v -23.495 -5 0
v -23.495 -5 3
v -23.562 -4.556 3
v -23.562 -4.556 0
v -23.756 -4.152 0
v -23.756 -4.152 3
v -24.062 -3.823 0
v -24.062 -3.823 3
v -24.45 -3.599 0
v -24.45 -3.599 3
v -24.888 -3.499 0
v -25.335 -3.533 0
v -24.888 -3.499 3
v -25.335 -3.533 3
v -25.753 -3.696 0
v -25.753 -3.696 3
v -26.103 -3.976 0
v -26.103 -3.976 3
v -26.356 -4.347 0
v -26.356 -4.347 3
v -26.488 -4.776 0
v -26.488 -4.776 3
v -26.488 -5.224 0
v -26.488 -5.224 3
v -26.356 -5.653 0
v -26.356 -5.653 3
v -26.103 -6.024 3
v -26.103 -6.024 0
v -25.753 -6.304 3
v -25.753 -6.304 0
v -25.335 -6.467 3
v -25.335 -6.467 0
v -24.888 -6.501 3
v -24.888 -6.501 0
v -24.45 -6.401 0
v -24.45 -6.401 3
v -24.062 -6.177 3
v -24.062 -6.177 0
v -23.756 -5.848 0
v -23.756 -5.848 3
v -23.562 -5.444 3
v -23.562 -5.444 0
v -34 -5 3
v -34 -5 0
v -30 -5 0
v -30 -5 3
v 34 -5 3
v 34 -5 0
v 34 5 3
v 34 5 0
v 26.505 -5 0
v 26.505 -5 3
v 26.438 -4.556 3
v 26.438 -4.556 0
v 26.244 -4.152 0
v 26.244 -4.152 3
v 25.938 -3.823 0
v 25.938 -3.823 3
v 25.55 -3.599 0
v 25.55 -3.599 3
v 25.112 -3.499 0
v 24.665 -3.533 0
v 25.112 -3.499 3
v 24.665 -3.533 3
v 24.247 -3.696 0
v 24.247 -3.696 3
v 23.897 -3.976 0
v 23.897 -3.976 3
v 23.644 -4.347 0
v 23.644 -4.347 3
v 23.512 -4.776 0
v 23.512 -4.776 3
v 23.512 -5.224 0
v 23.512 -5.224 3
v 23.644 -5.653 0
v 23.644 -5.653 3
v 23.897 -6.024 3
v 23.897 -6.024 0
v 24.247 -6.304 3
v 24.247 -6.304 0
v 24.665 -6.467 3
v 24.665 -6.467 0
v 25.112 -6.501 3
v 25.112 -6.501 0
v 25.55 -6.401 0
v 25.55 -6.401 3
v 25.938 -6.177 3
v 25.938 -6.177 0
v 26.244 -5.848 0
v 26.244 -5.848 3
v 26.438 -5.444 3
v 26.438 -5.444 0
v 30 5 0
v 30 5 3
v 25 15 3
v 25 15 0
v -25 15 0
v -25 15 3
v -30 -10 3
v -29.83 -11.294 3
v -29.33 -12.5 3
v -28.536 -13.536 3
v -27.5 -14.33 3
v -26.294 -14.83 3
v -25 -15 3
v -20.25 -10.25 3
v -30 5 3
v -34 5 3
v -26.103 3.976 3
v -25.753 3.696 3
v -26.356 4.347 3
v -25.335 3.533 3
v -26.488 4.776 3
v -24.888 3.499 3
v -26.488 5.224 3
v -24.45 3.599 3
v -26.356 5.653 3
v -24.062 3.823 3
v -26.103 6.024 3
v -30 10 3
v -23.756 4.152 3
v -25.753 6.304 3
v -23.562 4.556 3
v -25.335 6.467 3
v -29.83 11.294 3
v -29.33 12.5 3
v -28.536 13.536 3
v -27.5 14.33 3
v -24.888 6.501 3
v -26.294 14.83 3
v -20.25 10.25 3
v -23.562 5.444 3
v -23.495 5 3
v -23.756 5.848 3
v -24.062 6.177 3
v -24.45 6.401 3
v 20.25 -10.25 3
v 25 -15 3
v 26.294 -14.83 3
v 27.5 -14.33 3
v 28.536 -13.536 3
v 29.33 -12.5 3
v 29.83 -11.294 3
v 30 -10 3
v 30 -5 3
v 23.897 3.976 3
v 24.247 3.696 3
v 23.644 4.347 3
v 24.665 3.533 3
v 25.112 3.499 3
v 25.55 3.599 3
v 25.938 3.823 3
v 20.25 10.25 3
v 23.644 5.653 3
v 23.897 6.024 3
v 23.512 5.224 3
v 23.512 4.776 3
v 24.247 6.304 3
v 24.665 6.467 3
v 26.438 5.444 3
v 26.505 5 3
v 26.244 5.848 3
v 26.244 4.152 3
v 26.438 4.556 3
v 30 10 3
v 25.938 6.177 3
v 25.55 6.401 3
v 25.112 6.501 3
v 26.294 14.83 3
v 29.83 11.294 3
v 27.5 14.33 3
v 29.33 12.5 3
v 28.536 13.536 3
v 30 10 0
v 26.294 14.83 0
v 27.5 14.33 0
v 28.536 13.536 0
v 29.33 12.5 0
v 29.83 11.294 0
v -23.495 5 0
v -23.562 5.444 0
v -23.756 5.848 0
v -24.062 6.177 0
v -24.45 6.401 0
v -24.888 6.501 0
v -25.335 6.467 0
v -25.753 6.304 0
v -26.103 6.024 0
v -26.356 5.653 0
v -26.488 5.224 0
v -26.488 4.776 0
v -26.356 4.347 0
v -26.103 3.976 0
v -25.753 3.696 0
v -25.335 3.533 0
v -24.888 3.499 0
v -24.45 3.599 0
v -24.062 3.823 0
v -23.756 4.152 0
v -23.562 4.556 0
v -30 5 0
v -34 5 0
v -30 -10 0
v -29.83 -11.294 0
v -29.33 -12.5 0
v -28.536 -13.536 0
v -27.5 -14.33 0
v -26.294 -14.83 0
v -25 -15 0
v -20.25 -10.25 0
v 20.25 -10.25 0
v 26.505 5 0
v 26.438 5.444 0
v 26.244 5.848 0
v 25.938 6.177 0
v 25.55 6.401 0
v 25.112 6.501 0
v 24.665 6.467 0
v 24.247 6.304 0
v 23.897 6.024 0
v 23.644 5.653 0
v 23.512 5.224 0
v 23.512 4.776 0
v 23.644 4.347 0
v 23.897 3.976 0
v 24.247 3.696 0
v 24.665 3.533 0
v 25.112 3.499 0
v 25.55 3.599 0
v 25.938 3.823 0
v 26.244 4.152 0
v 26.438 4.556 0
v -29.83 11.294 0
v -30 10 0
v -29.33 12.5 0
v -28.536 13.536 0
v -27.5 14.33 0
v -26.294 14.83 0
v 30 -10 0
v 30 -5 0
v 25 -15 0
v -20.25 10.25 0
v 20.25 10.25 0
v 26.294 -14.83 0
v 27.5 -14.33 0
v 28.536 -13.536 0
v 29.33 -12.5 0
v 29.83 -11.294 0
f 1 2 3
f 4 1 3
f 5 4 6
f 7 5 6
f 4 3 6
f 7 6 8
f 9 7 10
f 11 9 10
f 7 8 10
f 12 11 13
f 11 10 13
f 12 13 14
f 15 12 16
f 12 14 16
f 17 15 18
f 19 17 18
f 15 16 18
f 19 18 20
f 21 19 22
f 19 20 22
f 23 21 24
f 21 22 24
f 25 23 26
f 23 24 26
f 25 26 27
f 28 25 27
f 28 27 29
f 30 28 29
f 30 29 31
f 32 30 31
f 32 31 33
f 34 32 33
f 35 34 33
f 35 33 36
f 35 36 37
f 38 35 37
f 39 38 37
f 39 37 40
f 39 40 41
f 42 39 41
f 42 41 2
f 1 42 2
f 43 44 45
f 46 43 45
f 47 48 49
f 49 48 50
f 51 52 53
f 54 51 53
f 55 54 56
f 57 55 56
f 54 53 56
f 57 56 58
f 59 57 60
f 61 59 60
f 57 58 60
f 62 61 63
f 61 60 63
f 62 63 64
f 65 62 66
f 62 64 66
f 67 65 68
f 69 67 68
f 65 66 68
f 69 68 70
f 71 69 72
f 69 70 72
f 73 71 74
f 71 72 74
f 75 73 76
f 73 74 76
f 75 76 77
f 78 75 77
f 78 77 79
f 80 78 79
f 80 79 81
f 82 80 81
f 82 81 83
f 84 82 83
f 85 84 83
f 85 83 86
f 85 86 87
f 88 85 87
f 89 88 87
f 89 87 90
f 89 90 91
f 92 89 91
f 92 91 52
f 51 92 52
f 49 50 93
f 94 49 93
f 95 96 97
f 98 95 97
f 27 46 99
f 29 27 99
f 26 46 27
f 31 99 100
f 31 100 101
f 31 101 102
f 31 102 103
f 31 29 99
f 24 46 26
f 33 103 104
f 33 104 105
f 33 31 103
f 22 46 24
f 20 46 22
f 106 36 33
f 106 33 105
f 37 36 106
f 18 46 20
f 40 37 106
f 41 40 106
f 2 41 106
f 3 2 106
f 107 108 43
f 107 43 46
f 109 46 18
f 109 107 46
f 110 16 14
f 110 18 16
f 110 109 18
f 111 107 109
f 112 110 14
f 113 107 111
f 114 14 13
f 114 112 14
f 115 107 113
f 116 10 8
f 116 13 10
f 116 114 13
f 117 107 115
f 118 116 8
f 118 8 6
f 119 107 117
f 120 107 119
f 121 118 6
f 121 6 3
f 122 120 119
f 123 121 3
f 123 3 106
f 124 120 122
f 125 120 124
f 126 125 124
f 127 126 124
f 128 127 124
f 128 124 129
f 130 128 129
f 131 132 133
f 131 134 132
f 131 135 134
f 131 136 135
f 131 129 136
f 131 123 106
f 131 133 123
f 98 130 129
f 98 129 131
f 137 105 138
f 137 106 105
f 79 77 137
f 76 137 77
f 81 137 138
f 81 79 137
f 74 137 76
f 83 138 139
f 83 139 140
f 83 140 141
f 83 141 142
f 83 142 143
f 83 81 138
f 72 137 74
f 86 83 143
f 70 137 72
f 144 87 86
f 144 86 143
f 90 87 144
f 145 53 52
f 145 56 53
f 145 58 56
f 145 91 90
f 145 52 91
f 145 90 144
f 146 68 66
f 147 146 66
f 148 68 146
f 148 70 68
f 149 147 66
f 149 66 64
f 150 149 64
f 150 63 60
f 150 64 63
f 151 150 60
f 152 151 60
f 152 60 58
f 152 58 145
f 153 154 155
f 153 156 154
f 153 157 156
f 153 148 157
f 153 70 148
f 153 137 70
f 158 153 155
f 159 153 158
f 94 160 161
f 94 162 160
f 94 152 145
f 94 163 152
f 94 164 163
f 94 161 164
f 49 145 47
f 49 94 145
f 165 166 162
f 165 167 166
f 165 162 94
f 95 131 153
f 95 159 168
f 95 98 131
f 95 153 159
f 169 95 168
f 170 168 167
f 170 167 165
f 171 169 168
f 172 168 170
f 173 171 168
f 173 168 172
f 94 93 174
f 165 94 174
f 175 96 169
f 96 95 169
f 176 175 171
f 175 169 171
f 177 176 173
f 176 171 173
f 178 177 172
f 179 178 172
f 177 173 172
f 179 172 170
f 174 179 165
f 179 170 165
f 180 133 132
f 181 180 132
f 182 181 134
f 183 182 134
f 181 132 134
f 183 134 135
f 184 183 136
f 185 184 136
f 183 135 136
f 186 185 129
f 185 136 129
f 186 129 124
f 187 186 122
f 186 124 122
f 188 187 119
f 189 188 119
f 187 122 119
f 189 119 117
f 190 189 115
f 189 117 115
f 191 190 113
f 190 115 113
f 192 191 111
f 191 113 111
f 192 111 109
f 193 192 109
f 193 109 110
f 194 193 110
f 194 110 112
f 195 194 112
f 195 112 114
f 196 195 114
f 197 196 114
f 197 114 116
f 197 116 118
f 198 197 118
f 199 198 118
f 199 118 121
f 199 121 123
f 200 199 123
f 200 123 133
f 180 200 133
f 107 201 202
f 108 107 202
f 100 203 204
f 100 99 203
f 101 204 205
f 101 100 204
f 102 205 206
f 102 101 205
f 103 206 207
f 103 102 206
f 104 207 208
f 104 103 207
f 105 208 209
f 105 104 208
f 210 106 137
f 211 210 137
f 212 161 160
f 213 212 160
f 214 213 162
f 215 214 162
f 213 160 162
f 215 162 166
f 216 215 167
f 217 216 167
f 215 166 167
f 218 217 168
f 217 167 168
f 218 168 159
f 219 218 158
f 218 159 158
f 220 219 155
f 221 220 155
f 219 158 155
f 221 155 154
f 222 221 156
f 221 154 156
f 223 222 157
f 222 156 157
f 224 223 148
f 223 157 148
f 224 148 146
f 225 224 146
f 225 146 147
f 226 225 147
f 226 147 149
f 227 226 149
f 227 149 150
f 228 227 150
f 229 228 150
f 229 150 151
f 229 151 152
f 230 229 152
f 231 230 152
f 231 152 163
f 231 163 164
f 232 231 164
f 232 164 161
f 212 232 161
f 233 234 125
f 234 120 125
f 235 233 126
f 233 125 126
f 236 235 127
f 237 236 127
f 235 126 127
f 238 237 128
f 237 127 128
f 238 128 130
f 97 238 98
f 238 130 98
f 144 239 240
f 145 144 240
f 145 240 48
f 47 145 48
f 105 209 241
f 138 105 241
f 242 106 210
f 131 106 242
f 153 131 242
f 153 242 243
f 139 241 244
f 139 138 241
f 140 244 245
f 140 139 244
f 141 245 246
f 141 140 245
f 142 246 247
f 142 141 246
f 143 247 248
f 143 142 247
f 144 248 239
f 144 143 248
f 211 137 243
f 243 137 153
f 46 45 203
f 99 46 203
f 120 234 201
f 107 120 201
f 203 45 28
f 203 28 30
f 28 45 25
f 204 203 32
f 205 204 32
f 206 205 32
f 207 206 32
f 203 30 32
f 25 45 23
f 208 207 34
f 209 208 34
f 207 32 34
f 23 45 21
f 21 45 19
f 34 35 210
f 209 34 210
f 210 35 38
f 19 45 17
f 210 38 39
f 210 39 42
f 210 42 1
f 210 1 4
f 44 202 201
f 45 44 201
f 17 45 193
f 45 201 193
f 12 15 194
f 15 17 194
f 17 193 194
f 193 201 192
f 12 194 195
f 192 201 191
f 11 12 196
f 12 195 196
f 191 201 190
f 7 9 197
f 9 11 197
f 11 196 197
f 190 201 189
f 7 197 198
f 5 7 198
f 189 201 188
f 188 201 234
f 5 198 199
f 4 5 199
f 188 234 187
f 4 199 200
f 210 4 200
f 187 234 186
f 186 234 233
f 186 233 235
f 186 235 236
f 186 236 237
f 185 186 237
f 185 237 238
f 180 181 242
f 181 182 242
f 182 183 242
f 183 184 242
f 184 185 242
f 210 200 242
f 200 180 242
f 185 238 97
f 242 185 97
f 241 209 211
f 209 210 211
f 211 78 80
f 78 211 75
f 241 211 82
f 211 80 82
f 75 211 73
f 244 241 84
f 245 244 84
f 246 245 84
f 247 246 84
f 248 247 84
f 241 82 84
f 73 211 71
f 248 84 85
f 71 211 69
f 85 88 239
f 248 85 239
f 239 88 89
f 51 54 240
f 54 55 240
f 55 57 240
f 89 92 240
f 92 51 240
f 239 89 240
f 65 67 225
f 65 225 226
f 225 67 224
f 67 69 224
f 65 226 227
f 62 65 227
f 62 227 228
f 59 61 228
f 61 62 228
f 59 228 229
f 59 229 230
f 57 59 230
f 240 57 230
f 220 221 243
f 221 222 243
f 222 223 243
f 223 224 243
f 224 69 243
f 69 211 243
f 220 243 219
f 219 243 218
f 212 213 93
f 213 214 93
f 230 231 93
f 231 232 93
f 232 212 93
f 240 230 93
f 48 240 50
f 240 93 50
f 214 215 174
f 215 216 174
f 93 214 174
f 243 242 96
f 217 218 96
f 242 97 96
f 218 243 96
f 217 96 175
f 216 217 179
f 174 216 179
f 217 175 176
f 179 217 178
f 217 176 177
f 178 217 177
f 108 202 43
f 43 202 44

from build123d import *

# Parameters (mm, degrees)
SALIENTE_EXTRUIR1_DEPTH = 3
CORTAR_EXTRUIR1_REACH   = 5
CROQUIS2_R              = 1.505219631
CROQUIS2_W              = 40.5
CROQUIS2_H              = 20.5
REDONDEO1_R             = 5


with BuildPart() as part:
    # Croquis1 → Saliente-Extruir1 (new body)
    with BuildSketch(Plane.XY):
        Polygon((-30, -5), (-30, -15), (30, -15), (30, -5), (34, -5), (34, 5), (30, 5), (30, 15), (-30, 15), (-30, 5), (-34, 5), (-34, -5), align=None)
    extrude(amount=SALIENTE_EXTRUIR1_DEPTH)

    # Croquis2 → Cortar-Extruir1 (cut, up to next)
    with BuildSketch(Plane.XY.offset(3), mode=Mode.PRIVATE) as cortar_extruir1_sk1:
        with Locations((25, 5)):
            Circle(CROQUIS2_R)
    cortar_extruir1_tool1 = extrude(cortar_extruir1_sk1.sketch, amount=-CORTAR_EXTRUIR1_REACH, mode=Mode.PRIVATE) & part.part
    add(cortar_extruir1_tool1.solids().sort_by_distance((25, 5, 3))[0], mode=Mode.SUBTRACT)
    # Croquis2 → Cortar-Extruir1 (cut, up to next)
    with BuildSketch(Plane.XY.offset(3), mode=Mode.PRIVATE) as cortar_extruir1_sk2:
        with Locations((-25, 5)):
            Circle(CROQUIS2_R)
    cortar_extruir1_tool2 = extrude(cortar_extruir1_sk2.sketch, amount=-CORTAR_EXTRUIR1_REACH, mode=Mode.PRIVATE) & part.part
    add(cortar_extruir1_tool2.solids().sort_by_distance((-25, 5, 3))[0], mode=Mode.SUBTRACT)
    # Croquis2 → Cortar-Extruir1 (cut, up to next)
    with BuildSketch(Plane.XY.offset(3), mode=Mode.PRIVATE) as cortar_extruir1_sk3:
        with Locations((25, -5)):
            Circle(CROQUIS2_R)
    cortar_extruir1_tool3 = extrude(cortar_extruir1_sk3.sketch, amount=-CORTAR_EXTRUIR1_REACH, mode=Mode.PRIVATE) & part.part
    add(cortar_extruir1_tool3.solids().sort_by_distance((25, -5, 3))[0], mode=Mode.SUBTRACT)
    # Croquis2 → Cortar-Extruir1 (cut, up to next)
    with BuildSketch(Plane.XY.offset(3), mode=Mode.PRIVATE) as cortar_extruir1_sk4:
        with Locations((-25, -5)):
            Circle(CROQUIS2_R)
    cortar_extruir1_tool4 = extrude(cortar_extruir1_sk4.sketch, amount=-CORTAR_EXTRUIR1_REACH, mode=Mode.PRIVATE) & part.part
    add(cortar_extruir1_tool4.solids().sort_by_distance((-25, -5, 3))[0], mode=Mode.SUBTRACT)
    # Croquis2 → Cortar-Extruir1 (cut, up to next)
    with BuildSketch(Plane.XY.offset(3), mode=Mode.PRIVATE) as cortar_extruir1_sk5:
        Rectangle(CROQUIS2_W, CROQUIS2_H)
    cortar_extruir1_tool5 = extrude(cortar_extruir1_sk5.sketch, amount=-CORTAR_EXTRUIR1_REACH, mode=Mode.PRIVATE) & part.part
    add(cortar_extruir1_tool5.solids().sort_by_distance((0, 0, 3))[0], mode=Mode.SUBTRACT)

    # Redondeo1
    redondeo1_edges = [part.edges().sort_by_distance(p)[0] for p in [
        (30, -15, 1.5),
        (-30, -15, 1.5),
        (-30, 15, 1.5),
        (30, 15, 1.5),
    ]]
    fillet(redondeo1_edges, radius=REDONDEO1_R)


solid = part.part
